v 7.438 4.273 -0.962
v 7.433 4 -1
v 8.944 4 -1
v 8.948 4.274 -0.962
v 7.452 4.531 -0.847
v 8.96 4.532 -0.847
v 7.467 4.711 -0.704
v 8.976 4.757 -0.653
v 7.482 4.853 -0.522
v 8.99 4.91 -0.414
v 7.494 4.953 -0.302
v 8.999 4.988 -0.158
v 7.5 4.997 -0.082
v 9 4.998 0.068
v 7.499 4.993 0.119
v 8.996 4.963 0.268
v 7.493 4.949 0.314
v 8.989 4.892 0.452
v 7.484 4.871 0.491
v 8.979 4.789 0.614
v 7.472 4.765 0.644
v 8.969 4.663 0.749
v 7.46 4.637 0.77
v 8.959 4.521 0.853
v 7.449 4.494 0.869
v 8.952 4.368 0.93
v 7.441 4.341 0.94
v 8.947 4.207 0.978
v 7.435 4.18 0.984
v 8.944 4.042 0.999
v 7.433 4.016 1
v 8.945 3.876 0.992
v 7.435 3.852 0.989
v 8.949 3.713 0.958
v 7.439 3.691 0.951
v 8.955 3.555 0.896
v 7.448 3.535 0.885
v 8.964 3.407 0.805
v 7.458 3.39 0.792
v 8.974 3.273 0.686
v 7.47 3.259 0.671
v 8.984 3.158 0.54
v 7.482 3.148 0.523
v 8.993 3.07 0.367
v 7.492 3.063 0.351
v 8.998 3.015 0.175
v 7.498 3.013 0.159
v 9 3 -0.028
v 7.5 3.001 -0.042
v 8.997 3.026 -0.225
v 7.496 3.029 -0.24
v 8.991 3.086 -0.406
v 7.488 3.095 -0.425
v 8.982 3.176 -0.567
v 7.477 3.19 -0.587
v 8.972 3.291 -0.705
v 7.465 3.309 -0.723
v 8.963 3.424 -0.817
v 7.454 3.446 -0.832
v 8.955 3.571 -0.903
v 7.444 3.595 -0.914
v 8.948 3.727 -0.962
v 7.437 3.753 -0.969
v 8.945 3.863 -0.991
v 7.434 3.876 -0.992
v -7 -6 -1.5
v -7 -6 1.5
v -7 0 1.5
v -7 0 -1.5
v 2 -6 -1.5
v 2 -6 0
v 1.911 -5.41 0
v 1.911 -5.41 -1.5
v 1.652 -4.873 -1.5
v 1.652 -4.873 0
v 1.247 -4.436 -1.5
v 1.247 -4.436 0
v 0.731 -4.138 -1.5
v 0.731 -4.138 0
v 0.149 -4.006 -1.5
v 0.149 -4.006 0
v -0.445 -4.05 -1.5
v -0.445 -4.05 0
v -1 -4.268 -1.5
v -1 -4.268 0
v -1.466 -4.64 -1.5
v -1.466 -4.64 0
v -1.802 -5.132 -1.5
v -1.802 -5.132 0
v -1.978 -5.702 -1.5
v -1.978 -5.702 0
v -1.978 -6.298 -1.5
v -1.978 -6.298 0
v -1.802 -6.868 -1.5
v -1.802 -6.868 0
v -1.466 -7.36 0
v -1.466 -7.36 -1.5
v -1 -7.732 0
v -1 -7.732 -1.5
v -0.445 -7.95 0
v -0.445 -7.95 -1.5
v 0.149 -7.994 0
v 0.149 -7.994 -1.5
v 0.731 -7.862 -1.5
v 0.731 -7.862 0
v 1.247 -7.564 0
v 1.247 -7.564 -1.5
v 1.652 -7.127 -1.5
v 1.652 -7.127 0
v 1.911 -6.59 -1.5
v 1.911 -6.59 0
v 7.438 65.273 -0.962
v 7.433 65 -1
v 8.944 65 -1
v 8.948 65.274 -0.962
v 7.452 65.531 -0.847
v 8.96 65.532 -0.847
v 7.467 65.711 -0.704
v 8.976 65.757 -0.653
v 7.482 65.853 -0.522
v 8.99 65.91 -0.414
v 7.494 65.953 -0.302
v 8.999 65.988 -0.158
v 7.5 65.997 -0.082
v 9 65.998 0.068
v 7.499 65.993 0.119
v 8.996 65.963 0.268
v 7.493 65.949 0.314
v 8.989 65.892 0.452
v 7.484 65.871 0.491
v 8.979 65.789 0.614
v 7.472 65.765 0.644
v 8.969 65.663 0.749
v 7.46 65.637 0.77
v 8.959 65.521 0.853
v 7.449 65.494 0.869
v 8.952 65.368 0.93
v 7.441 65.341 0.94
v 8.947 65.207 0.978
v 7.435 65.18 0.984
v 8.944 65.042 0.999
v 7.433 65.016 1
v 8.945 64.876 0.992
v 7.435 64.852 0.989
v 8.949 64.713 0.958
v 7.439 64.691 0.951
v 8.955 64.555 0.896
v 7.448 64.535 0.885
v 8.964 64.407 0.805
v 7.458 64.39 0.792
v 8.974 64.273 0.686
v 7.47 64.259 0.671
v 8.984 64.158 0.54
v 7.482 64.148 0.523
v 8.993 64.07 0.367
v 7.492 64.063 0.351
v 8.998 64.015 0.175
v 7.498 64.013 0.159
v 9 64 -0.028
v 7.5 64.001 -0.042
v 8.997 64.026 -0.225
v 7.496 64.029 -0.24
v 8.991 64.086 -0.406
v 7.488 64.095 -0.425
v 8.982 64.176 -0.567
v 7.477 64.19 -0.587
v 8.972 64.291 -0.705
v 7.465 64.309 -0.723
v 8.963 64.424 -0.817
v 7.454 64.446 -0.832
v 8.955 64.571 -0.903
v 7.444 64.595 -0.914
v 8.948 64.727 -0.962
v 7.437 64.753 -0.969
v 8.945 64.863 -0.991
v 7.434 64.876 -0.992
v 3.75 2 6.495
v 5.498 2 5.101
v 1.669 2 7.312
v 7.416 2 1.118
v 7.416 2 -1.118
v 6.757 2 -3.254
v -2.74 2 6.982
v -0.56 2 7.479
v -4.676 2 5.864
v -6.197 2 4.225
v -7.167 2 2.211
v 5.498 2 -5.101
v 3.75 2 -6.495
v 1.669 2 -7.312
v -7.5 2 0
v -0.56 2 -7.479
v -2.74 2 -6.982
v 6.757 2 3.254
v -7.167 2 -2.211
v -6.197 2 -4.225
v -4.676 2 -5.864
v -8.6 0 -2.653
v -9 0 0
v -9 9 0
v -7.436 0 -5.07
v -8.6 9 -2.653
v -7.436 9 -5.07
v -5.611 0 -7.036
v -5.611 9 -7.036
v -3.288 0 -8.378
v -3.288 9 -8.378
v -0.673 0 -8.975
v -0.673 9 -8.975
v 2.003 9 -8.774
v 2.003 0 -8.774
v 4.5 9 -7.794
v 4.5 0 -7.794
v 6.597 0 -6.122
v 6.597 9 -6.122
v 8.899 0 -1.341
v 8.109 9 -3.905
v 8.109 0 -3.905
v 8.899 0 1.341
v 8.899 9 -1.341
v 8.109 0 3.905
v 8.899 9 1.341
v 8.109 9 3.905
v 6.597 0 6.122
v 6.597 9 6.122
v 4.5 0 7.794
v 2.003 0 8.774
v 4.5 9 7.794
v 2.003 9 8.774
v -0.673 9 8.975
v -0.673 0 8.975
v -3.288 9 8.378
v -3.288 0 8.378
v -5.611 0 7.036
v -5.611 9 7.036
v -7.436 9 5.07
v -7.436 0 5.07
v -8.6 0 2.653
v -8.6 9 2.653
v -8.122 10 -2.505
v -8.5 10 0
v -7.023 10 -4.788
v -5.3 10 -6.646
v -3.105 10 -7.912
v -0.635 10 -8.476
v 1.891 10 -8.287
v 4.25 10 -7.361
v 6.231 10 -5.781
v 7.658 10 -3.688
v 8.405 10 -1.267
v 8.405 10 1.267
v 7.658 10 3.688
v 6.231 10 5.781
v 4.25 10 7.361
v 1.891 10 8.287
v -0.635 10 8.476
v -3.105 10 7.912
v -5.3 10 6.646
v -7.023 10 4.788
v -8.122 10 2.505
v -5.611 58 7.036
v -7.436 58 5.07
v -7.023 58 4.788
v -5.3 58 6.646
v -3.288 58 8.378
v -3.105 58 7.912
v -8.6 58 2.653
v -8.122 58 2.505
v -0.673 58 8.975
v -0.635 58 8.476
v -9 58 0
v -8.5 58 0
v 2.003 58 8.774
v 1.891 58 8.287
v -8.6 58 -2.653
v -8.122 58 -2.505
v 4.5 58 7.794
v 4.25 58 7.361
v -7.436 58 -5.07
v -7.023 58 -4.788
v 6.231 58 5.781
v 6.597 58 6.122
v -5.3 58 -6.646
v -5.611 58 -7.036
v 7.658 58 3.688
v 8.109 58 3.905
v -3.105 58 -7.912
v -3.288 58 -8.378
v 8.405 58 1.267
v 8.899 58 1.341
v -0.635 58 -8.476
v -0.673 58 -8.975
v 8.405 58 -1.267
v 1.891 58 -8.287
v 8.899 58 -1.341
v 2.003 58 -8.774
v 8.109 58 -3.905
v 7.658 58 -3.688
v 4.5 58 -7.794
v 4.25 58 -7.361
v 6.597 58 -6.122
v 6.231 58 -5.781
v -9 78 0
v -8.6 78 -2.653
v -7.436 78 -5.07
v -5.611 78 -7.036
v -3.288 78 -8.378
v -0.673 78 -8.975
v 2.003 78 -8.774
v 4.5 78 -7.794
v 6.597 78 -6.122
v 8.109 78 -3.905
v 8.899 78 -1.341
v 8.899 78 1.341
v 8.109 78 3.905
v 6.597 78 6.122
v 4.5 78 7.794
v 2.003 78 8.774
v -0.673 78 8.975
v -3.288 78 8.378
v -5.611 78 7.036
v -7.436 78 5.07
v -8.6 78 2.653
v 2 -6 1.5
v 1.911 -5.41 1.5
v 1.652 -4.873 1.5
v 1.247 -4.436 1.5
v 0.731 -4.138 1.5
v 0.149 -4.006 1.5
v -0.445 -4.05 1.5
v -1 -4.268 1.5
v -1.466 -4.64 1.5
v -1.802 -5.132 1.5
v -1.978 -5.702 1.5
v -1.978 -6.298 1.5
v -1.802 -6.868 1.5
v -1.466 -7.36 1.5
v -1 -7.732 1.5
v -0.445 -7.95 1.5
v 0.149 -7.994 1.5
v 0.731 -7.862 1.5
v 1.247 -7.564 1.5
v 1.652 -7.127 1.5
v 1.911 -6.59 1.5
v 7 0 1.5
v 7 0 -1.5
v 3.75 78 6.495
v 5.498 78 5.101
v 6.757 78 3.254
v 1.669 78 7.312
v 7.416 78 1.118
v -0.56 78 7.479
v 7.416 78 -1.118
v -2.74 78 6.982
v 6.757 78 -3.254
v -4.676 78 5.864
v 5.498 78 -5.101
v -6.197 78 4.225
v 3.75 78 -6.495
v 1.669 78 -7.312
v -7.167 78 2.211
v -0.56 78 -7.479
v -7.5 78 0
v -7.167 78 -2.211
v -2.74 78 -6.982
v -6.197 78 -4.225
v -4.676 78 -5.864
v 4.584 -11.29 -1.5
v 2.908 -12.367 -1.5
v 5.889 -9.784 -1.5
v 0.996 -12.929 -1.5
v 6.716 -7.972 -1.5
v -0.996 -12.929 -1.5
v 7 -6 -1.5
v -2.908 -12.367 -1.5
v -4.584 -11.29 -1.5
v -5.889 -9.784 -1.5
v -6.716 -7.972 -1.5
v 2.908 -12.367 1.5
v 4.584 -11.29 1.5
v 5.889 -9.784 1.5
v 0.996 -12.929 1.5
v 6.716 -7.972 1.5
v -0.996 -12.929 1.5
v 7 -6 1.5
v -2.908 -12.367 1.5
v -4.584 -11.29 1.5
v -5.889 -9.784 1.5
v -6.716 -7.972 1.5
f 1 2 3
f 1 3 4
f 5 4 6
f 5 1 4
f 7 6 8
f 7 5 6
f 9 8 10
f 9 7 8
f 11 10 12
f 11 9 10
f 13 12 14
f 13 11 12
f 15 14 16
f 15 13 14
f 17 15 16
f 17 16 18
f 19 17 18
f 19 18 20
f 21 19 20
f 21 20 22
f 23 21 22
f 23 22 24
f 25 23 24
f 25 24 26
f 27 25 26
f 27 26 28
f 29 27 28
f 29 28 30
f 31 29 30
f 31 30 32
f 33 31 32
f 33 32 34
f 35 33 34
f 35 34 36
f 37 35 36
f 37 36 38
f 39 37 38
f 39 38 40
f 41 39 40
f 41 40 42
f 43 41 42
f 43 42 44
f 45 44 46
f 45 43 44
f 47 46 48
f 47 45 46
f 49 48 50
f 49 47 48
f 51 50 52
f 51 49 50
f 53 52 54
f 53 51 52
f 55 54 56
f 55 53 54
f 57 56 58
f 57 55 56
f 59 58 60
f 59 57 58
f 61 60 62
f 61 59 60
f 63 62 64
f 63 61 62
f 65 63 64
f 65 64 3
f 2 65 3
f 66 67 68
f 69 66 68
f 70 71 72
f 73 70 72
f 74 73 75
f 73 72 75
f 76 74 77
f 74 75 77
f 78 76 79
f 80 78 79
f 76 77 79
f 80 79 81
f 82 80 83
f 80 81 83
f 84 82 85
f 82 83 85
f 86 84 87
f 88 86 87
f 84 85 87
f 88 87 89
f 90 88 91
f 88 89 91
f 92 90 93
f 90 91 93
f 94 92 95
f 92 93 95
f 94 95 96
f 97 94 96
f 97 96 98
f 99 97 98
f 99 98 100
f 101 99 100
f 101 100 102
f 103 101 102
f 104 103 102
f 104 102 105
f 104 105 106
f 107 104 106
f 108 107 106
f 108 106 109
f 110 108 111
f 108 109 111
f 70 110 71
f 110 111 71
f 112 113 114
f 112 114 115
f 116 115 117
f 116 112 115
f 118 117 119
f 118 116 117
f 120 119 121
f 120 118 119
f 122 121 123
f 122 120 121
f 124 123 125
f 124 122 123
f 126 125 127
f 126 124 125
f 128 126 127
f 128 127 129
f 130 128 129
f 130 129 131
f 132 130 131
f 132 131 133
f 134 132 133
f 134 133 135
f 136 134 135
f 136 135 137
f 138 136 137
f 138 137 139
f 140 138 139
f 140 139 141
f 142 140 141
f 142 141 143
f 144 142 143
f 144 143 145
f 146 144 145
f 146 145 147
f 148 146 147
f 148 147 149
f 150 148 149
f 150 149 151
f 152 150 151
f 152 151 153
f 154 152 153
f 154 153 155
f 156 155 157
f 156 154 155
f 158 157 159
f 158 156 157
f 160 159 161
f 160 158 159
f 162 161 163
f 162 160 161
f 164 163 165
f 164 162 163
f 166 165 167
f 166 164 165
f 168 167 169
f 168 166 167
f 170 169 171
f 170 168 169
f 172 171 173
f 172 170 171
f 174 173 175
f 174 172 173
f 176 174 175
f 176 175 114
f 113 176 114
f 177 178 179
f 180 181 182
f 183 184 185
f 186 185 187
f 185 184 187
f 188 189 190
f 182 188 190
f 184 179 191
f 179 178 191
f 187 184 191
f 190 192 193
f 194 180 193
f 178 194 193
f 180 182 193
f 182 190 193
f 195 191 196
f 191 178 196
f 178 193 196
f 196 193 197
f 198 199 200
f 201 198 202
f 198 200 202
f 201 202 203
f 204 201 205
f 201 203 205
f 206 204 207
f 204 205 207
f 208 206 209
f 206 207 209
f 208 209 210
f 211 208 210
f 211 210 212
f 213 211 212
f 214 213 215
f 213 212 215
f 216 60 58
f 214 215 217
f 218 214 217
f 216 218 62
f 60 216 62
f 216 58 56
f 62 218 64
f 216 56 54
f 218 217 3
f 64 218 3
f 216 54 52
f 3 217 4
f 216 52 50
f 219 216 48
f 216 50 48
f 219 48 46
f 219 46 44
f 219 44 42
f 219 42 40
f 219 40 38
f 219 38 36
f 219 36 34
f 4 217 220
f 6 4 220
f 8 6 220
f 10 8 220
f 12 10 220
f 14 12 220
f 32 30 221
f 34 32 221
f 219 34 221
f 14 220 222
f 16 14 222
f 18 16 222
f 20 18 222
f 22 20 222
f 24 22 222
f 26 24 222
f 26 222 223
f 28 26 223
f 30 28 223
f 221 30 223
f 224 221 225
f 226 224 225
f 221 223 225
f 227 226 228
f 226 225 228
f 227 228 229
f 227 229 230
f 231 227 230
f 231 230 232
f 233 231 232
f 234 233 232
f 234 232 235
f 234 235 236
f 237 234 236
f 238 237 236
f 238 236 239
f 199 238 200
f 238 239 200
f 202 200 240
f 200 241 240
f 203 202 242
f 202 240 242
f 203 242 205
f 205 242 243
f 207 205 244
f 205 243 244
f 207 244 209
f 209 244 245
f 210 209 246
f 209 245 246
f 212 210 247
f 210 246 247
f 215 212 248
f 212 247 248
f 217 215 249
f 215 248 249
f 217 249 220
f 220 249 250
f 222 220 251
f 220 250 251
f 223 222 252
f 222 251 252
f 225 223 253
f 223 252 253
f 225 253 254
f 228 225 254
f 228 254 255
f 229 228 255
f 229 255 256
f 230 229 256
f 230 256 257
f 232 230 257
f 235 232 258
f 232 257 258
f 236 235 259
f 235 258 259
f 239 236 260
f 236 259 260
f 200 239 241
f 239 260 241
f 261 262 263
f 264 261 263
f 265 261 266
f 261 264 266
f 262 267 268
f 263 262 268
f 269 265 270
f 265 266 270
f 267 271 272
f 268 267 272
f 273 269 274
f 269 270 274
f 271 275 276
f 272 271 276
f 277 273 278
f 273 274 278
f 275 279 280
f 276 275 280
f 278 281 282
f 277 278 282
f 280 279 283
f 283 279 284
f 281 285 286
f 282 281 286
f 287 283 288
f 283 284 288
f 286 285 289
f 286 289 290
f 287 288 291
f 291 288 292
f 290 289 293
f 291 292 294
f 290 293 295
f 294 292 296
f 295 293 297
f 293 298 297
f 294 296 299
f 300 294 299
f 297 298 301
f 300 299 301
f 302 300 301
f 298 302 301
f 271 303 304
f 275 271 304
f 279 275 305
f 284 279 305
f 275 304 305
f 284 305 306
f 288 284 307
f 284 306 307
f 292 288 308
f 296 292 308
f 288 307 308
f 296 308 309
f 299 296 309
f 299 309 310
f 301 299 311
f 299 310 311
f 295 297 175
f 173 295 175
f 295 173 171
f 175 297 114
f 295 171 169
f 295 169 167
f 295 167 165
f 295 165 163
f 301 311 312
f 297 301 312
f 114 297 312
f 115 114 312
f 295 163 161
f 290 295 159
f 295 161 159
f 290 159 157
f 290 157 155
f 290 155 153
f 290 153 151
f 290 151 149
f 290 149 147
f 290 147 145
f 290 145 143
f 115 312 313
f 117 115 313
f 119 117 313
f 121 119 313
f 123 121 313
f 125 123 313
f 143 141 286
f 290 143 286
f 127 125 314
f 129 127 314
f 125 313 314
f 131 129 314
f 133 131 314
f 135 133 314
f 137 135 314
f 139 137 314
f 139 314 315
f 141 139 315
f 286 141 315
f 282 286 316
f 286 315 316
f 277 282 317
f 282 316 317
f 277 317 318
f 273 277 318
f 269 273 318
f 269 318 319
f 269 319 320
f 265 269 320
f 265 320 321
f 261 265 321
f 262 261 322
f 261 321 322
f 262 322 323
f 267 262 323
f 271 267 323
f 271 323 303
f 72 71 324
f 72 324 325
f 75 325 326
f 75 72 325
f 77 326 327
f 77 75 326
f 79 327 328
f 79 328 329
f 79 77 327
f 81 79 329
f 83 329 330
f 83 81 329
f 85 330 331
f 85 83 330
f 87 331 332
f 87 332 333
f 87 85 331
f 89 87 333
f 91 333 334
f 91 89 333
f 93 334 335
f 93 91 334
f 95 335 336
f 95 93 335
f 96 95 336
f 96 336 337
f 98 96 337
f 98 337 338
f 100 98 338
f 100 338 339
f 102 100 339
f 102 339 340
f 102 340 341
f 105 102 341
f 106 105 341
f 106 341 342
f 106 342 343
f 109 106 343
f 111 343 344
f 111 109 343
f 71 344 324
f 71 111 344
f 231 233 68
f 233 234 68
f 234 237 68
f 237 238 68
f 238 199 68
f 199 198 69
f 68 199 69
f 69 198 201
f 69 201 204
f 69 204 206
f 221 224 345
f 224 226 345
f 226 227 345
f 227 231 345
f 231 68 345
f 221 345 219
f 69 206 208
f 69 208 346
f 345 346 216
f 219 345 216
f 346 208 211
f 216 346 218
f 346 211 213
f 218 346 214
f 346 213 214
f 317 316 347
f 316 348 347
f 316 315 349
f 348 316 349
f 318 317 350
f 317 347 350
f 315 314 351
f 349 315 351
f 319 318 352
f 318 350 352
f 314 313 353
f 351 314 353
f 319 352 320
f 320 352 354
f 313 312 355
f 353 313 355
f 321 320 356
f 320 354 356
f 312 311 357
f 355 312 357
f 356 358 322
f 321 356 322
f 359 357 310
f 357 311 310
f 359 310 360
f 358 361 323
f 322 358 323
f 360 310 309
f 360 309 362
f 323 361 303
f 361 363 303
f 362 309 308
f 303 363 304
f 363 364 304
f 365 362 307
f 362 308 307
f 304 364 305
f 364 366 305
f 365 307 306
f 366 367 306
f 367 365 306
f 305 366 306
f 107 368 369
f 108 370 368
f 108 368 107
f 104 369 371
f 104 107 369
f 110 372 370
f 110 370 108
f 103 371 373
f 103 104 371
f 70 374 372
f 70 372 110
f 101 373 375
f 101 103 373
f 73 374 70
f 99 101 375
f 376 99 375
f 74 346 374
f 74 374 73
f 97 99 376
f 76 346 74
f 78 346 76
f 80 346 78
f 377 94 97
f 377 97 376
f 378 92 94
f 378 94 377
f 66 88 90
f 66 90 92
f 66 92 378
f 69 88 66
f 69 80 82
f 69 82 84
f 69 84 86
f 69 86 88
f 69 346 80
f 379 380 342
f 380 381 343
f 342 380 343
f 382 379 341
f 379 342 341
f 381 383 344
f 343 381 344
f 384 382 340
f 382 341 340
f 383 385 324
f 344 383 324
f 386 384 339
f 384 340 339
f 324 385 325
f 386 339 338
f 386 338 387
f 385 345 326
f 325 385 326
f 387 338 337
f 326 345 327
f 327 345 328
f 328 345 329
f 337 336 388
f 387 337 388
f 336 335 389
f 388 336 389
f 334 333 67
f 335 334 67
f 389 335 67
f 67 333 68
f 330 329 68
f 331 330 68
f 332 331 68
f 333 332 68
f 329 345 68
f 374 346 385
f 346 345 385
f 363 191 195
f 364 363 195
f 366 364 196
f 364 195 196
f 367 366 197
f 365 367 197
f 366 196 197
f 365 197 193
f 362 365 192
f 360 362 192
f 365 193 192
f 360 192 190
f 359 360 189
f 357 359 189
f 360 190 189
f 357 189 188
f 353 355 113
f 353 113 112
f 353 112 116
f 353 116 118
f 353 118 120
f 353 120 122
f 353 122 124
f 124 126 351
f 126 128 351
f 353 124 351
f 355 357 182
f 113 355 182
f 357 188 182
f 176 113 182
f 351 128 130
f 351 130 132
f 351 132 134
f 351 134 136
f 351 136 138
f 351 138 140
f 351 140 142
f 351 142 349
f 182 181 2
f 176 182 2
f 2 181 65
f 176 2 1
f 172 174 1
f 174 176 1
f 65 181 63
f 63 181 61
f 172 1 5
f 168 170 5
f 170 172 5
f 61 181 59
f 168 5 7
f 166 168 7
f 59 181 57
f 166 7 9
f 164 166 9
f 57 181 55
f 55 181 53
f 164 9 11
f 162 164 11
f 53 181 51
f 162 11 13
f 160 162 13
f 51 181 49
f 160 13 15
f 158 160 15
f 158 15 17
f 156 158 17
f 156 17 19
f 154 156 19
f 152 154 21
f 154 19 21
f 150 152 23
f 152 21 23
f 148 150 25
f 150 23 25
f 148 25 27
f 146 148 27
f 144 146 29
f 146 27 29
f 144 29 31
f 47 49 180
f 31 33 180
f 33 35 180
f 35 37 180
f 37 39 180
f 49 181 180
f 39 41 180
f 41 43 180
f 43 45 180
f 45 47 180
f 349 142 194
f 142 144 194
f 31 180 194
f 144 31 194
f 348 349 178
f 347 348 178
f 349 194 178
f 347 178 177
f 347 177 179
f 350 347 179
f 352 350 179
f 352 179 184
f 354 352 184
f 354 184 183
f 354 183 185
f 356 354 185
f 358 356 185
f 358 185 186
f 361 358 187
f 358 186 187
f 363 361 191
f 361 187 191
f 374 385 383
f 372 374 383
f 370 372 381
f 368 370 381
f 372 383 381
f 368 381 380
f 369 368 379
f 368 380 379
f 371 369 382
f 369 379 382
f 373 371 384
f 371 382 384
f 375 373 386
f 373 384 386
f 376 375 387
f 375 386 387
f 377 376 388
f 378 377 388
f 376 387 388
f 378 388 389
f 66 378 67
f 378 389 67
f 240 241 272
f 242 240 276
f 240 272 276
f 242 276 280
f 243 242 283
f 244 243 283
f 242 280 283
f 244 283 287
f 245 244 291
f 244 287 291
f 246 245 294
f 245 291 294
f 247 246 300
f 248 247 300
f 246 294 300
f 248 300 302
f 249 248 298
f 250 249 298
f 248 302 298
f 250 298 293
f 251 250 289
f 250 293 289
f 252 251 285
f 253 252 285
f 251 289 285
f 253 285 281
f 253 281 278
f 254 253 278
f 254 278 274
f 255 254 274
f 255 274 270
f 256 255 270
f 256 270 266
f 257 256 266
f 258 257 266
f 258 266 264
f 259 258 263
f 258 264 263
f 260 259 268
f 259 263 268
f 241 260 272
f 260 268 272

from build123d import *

# Parameters (mm, degrees)
BOSS_EXTRUDE1_DEPTH      = 1.5
BOSS_EXTRUDE1_DEPTH_BACK = 1.5
SKETCH2_R                = 2
SKETCH3_R                = 1
CUT_EXTRUDE1_DEPTH       = 50


with BuildPart() as part:
    # Sketch1 → Revolve1 (revolve)
    with BuildSketch(Plane.XY):
        Polygon((0, 0), (-9, 0), (-9, 9), (-8.5, 10), (-8.5, 58), (-9, 58), (-9, 78), (-7.5, 78), (-7.5, 2), (0, 2), align=None)
    revolve(axis=Axis((0, 78, 0), (0, -1, 0)))

    # Sketch2 → Boss-Extrude1 (add, two sides: drawn at the far end of the back side and taken through both)
    with BuildSketch(Plane.XY.offset(-BOSS_EXTRUDE1_DEPTH_BACK)):
        with BuildLine():
            Line((-7, 0), (7, 0))
            Line((7, 0), (7, -6))
            ThreePointArc((7, -6), (0, -13), (-7, -6))
            Line((-7, -6), (-7, 0))
        make_face()
        with Locations((0, -6)):
            Circle(SKETCH2_R, mode=Mode.SUBTRACT)
    extrude(amount=BOSS_EXTRUDE1_DEPTH + BOSS_EXTRUDE1_DEPTH_BACK)

    # Sketch3 → Cut-Extrude1 (cut)
    with BuildSketch(Plane(origin=(0, 0, 0), x_dir=(0, 0, -1), z_dir=(1, 0, 0))):
        with Locations((0, 65)):
            Circle(SKETCH3_R)
        with Locations((0, 4)):
            Circle(SKETCH3_R)
    extrude(amount=CUT_EXTRUDE1_DEPTH, mode=Mode.SUBTRACT)


solid = part.part
